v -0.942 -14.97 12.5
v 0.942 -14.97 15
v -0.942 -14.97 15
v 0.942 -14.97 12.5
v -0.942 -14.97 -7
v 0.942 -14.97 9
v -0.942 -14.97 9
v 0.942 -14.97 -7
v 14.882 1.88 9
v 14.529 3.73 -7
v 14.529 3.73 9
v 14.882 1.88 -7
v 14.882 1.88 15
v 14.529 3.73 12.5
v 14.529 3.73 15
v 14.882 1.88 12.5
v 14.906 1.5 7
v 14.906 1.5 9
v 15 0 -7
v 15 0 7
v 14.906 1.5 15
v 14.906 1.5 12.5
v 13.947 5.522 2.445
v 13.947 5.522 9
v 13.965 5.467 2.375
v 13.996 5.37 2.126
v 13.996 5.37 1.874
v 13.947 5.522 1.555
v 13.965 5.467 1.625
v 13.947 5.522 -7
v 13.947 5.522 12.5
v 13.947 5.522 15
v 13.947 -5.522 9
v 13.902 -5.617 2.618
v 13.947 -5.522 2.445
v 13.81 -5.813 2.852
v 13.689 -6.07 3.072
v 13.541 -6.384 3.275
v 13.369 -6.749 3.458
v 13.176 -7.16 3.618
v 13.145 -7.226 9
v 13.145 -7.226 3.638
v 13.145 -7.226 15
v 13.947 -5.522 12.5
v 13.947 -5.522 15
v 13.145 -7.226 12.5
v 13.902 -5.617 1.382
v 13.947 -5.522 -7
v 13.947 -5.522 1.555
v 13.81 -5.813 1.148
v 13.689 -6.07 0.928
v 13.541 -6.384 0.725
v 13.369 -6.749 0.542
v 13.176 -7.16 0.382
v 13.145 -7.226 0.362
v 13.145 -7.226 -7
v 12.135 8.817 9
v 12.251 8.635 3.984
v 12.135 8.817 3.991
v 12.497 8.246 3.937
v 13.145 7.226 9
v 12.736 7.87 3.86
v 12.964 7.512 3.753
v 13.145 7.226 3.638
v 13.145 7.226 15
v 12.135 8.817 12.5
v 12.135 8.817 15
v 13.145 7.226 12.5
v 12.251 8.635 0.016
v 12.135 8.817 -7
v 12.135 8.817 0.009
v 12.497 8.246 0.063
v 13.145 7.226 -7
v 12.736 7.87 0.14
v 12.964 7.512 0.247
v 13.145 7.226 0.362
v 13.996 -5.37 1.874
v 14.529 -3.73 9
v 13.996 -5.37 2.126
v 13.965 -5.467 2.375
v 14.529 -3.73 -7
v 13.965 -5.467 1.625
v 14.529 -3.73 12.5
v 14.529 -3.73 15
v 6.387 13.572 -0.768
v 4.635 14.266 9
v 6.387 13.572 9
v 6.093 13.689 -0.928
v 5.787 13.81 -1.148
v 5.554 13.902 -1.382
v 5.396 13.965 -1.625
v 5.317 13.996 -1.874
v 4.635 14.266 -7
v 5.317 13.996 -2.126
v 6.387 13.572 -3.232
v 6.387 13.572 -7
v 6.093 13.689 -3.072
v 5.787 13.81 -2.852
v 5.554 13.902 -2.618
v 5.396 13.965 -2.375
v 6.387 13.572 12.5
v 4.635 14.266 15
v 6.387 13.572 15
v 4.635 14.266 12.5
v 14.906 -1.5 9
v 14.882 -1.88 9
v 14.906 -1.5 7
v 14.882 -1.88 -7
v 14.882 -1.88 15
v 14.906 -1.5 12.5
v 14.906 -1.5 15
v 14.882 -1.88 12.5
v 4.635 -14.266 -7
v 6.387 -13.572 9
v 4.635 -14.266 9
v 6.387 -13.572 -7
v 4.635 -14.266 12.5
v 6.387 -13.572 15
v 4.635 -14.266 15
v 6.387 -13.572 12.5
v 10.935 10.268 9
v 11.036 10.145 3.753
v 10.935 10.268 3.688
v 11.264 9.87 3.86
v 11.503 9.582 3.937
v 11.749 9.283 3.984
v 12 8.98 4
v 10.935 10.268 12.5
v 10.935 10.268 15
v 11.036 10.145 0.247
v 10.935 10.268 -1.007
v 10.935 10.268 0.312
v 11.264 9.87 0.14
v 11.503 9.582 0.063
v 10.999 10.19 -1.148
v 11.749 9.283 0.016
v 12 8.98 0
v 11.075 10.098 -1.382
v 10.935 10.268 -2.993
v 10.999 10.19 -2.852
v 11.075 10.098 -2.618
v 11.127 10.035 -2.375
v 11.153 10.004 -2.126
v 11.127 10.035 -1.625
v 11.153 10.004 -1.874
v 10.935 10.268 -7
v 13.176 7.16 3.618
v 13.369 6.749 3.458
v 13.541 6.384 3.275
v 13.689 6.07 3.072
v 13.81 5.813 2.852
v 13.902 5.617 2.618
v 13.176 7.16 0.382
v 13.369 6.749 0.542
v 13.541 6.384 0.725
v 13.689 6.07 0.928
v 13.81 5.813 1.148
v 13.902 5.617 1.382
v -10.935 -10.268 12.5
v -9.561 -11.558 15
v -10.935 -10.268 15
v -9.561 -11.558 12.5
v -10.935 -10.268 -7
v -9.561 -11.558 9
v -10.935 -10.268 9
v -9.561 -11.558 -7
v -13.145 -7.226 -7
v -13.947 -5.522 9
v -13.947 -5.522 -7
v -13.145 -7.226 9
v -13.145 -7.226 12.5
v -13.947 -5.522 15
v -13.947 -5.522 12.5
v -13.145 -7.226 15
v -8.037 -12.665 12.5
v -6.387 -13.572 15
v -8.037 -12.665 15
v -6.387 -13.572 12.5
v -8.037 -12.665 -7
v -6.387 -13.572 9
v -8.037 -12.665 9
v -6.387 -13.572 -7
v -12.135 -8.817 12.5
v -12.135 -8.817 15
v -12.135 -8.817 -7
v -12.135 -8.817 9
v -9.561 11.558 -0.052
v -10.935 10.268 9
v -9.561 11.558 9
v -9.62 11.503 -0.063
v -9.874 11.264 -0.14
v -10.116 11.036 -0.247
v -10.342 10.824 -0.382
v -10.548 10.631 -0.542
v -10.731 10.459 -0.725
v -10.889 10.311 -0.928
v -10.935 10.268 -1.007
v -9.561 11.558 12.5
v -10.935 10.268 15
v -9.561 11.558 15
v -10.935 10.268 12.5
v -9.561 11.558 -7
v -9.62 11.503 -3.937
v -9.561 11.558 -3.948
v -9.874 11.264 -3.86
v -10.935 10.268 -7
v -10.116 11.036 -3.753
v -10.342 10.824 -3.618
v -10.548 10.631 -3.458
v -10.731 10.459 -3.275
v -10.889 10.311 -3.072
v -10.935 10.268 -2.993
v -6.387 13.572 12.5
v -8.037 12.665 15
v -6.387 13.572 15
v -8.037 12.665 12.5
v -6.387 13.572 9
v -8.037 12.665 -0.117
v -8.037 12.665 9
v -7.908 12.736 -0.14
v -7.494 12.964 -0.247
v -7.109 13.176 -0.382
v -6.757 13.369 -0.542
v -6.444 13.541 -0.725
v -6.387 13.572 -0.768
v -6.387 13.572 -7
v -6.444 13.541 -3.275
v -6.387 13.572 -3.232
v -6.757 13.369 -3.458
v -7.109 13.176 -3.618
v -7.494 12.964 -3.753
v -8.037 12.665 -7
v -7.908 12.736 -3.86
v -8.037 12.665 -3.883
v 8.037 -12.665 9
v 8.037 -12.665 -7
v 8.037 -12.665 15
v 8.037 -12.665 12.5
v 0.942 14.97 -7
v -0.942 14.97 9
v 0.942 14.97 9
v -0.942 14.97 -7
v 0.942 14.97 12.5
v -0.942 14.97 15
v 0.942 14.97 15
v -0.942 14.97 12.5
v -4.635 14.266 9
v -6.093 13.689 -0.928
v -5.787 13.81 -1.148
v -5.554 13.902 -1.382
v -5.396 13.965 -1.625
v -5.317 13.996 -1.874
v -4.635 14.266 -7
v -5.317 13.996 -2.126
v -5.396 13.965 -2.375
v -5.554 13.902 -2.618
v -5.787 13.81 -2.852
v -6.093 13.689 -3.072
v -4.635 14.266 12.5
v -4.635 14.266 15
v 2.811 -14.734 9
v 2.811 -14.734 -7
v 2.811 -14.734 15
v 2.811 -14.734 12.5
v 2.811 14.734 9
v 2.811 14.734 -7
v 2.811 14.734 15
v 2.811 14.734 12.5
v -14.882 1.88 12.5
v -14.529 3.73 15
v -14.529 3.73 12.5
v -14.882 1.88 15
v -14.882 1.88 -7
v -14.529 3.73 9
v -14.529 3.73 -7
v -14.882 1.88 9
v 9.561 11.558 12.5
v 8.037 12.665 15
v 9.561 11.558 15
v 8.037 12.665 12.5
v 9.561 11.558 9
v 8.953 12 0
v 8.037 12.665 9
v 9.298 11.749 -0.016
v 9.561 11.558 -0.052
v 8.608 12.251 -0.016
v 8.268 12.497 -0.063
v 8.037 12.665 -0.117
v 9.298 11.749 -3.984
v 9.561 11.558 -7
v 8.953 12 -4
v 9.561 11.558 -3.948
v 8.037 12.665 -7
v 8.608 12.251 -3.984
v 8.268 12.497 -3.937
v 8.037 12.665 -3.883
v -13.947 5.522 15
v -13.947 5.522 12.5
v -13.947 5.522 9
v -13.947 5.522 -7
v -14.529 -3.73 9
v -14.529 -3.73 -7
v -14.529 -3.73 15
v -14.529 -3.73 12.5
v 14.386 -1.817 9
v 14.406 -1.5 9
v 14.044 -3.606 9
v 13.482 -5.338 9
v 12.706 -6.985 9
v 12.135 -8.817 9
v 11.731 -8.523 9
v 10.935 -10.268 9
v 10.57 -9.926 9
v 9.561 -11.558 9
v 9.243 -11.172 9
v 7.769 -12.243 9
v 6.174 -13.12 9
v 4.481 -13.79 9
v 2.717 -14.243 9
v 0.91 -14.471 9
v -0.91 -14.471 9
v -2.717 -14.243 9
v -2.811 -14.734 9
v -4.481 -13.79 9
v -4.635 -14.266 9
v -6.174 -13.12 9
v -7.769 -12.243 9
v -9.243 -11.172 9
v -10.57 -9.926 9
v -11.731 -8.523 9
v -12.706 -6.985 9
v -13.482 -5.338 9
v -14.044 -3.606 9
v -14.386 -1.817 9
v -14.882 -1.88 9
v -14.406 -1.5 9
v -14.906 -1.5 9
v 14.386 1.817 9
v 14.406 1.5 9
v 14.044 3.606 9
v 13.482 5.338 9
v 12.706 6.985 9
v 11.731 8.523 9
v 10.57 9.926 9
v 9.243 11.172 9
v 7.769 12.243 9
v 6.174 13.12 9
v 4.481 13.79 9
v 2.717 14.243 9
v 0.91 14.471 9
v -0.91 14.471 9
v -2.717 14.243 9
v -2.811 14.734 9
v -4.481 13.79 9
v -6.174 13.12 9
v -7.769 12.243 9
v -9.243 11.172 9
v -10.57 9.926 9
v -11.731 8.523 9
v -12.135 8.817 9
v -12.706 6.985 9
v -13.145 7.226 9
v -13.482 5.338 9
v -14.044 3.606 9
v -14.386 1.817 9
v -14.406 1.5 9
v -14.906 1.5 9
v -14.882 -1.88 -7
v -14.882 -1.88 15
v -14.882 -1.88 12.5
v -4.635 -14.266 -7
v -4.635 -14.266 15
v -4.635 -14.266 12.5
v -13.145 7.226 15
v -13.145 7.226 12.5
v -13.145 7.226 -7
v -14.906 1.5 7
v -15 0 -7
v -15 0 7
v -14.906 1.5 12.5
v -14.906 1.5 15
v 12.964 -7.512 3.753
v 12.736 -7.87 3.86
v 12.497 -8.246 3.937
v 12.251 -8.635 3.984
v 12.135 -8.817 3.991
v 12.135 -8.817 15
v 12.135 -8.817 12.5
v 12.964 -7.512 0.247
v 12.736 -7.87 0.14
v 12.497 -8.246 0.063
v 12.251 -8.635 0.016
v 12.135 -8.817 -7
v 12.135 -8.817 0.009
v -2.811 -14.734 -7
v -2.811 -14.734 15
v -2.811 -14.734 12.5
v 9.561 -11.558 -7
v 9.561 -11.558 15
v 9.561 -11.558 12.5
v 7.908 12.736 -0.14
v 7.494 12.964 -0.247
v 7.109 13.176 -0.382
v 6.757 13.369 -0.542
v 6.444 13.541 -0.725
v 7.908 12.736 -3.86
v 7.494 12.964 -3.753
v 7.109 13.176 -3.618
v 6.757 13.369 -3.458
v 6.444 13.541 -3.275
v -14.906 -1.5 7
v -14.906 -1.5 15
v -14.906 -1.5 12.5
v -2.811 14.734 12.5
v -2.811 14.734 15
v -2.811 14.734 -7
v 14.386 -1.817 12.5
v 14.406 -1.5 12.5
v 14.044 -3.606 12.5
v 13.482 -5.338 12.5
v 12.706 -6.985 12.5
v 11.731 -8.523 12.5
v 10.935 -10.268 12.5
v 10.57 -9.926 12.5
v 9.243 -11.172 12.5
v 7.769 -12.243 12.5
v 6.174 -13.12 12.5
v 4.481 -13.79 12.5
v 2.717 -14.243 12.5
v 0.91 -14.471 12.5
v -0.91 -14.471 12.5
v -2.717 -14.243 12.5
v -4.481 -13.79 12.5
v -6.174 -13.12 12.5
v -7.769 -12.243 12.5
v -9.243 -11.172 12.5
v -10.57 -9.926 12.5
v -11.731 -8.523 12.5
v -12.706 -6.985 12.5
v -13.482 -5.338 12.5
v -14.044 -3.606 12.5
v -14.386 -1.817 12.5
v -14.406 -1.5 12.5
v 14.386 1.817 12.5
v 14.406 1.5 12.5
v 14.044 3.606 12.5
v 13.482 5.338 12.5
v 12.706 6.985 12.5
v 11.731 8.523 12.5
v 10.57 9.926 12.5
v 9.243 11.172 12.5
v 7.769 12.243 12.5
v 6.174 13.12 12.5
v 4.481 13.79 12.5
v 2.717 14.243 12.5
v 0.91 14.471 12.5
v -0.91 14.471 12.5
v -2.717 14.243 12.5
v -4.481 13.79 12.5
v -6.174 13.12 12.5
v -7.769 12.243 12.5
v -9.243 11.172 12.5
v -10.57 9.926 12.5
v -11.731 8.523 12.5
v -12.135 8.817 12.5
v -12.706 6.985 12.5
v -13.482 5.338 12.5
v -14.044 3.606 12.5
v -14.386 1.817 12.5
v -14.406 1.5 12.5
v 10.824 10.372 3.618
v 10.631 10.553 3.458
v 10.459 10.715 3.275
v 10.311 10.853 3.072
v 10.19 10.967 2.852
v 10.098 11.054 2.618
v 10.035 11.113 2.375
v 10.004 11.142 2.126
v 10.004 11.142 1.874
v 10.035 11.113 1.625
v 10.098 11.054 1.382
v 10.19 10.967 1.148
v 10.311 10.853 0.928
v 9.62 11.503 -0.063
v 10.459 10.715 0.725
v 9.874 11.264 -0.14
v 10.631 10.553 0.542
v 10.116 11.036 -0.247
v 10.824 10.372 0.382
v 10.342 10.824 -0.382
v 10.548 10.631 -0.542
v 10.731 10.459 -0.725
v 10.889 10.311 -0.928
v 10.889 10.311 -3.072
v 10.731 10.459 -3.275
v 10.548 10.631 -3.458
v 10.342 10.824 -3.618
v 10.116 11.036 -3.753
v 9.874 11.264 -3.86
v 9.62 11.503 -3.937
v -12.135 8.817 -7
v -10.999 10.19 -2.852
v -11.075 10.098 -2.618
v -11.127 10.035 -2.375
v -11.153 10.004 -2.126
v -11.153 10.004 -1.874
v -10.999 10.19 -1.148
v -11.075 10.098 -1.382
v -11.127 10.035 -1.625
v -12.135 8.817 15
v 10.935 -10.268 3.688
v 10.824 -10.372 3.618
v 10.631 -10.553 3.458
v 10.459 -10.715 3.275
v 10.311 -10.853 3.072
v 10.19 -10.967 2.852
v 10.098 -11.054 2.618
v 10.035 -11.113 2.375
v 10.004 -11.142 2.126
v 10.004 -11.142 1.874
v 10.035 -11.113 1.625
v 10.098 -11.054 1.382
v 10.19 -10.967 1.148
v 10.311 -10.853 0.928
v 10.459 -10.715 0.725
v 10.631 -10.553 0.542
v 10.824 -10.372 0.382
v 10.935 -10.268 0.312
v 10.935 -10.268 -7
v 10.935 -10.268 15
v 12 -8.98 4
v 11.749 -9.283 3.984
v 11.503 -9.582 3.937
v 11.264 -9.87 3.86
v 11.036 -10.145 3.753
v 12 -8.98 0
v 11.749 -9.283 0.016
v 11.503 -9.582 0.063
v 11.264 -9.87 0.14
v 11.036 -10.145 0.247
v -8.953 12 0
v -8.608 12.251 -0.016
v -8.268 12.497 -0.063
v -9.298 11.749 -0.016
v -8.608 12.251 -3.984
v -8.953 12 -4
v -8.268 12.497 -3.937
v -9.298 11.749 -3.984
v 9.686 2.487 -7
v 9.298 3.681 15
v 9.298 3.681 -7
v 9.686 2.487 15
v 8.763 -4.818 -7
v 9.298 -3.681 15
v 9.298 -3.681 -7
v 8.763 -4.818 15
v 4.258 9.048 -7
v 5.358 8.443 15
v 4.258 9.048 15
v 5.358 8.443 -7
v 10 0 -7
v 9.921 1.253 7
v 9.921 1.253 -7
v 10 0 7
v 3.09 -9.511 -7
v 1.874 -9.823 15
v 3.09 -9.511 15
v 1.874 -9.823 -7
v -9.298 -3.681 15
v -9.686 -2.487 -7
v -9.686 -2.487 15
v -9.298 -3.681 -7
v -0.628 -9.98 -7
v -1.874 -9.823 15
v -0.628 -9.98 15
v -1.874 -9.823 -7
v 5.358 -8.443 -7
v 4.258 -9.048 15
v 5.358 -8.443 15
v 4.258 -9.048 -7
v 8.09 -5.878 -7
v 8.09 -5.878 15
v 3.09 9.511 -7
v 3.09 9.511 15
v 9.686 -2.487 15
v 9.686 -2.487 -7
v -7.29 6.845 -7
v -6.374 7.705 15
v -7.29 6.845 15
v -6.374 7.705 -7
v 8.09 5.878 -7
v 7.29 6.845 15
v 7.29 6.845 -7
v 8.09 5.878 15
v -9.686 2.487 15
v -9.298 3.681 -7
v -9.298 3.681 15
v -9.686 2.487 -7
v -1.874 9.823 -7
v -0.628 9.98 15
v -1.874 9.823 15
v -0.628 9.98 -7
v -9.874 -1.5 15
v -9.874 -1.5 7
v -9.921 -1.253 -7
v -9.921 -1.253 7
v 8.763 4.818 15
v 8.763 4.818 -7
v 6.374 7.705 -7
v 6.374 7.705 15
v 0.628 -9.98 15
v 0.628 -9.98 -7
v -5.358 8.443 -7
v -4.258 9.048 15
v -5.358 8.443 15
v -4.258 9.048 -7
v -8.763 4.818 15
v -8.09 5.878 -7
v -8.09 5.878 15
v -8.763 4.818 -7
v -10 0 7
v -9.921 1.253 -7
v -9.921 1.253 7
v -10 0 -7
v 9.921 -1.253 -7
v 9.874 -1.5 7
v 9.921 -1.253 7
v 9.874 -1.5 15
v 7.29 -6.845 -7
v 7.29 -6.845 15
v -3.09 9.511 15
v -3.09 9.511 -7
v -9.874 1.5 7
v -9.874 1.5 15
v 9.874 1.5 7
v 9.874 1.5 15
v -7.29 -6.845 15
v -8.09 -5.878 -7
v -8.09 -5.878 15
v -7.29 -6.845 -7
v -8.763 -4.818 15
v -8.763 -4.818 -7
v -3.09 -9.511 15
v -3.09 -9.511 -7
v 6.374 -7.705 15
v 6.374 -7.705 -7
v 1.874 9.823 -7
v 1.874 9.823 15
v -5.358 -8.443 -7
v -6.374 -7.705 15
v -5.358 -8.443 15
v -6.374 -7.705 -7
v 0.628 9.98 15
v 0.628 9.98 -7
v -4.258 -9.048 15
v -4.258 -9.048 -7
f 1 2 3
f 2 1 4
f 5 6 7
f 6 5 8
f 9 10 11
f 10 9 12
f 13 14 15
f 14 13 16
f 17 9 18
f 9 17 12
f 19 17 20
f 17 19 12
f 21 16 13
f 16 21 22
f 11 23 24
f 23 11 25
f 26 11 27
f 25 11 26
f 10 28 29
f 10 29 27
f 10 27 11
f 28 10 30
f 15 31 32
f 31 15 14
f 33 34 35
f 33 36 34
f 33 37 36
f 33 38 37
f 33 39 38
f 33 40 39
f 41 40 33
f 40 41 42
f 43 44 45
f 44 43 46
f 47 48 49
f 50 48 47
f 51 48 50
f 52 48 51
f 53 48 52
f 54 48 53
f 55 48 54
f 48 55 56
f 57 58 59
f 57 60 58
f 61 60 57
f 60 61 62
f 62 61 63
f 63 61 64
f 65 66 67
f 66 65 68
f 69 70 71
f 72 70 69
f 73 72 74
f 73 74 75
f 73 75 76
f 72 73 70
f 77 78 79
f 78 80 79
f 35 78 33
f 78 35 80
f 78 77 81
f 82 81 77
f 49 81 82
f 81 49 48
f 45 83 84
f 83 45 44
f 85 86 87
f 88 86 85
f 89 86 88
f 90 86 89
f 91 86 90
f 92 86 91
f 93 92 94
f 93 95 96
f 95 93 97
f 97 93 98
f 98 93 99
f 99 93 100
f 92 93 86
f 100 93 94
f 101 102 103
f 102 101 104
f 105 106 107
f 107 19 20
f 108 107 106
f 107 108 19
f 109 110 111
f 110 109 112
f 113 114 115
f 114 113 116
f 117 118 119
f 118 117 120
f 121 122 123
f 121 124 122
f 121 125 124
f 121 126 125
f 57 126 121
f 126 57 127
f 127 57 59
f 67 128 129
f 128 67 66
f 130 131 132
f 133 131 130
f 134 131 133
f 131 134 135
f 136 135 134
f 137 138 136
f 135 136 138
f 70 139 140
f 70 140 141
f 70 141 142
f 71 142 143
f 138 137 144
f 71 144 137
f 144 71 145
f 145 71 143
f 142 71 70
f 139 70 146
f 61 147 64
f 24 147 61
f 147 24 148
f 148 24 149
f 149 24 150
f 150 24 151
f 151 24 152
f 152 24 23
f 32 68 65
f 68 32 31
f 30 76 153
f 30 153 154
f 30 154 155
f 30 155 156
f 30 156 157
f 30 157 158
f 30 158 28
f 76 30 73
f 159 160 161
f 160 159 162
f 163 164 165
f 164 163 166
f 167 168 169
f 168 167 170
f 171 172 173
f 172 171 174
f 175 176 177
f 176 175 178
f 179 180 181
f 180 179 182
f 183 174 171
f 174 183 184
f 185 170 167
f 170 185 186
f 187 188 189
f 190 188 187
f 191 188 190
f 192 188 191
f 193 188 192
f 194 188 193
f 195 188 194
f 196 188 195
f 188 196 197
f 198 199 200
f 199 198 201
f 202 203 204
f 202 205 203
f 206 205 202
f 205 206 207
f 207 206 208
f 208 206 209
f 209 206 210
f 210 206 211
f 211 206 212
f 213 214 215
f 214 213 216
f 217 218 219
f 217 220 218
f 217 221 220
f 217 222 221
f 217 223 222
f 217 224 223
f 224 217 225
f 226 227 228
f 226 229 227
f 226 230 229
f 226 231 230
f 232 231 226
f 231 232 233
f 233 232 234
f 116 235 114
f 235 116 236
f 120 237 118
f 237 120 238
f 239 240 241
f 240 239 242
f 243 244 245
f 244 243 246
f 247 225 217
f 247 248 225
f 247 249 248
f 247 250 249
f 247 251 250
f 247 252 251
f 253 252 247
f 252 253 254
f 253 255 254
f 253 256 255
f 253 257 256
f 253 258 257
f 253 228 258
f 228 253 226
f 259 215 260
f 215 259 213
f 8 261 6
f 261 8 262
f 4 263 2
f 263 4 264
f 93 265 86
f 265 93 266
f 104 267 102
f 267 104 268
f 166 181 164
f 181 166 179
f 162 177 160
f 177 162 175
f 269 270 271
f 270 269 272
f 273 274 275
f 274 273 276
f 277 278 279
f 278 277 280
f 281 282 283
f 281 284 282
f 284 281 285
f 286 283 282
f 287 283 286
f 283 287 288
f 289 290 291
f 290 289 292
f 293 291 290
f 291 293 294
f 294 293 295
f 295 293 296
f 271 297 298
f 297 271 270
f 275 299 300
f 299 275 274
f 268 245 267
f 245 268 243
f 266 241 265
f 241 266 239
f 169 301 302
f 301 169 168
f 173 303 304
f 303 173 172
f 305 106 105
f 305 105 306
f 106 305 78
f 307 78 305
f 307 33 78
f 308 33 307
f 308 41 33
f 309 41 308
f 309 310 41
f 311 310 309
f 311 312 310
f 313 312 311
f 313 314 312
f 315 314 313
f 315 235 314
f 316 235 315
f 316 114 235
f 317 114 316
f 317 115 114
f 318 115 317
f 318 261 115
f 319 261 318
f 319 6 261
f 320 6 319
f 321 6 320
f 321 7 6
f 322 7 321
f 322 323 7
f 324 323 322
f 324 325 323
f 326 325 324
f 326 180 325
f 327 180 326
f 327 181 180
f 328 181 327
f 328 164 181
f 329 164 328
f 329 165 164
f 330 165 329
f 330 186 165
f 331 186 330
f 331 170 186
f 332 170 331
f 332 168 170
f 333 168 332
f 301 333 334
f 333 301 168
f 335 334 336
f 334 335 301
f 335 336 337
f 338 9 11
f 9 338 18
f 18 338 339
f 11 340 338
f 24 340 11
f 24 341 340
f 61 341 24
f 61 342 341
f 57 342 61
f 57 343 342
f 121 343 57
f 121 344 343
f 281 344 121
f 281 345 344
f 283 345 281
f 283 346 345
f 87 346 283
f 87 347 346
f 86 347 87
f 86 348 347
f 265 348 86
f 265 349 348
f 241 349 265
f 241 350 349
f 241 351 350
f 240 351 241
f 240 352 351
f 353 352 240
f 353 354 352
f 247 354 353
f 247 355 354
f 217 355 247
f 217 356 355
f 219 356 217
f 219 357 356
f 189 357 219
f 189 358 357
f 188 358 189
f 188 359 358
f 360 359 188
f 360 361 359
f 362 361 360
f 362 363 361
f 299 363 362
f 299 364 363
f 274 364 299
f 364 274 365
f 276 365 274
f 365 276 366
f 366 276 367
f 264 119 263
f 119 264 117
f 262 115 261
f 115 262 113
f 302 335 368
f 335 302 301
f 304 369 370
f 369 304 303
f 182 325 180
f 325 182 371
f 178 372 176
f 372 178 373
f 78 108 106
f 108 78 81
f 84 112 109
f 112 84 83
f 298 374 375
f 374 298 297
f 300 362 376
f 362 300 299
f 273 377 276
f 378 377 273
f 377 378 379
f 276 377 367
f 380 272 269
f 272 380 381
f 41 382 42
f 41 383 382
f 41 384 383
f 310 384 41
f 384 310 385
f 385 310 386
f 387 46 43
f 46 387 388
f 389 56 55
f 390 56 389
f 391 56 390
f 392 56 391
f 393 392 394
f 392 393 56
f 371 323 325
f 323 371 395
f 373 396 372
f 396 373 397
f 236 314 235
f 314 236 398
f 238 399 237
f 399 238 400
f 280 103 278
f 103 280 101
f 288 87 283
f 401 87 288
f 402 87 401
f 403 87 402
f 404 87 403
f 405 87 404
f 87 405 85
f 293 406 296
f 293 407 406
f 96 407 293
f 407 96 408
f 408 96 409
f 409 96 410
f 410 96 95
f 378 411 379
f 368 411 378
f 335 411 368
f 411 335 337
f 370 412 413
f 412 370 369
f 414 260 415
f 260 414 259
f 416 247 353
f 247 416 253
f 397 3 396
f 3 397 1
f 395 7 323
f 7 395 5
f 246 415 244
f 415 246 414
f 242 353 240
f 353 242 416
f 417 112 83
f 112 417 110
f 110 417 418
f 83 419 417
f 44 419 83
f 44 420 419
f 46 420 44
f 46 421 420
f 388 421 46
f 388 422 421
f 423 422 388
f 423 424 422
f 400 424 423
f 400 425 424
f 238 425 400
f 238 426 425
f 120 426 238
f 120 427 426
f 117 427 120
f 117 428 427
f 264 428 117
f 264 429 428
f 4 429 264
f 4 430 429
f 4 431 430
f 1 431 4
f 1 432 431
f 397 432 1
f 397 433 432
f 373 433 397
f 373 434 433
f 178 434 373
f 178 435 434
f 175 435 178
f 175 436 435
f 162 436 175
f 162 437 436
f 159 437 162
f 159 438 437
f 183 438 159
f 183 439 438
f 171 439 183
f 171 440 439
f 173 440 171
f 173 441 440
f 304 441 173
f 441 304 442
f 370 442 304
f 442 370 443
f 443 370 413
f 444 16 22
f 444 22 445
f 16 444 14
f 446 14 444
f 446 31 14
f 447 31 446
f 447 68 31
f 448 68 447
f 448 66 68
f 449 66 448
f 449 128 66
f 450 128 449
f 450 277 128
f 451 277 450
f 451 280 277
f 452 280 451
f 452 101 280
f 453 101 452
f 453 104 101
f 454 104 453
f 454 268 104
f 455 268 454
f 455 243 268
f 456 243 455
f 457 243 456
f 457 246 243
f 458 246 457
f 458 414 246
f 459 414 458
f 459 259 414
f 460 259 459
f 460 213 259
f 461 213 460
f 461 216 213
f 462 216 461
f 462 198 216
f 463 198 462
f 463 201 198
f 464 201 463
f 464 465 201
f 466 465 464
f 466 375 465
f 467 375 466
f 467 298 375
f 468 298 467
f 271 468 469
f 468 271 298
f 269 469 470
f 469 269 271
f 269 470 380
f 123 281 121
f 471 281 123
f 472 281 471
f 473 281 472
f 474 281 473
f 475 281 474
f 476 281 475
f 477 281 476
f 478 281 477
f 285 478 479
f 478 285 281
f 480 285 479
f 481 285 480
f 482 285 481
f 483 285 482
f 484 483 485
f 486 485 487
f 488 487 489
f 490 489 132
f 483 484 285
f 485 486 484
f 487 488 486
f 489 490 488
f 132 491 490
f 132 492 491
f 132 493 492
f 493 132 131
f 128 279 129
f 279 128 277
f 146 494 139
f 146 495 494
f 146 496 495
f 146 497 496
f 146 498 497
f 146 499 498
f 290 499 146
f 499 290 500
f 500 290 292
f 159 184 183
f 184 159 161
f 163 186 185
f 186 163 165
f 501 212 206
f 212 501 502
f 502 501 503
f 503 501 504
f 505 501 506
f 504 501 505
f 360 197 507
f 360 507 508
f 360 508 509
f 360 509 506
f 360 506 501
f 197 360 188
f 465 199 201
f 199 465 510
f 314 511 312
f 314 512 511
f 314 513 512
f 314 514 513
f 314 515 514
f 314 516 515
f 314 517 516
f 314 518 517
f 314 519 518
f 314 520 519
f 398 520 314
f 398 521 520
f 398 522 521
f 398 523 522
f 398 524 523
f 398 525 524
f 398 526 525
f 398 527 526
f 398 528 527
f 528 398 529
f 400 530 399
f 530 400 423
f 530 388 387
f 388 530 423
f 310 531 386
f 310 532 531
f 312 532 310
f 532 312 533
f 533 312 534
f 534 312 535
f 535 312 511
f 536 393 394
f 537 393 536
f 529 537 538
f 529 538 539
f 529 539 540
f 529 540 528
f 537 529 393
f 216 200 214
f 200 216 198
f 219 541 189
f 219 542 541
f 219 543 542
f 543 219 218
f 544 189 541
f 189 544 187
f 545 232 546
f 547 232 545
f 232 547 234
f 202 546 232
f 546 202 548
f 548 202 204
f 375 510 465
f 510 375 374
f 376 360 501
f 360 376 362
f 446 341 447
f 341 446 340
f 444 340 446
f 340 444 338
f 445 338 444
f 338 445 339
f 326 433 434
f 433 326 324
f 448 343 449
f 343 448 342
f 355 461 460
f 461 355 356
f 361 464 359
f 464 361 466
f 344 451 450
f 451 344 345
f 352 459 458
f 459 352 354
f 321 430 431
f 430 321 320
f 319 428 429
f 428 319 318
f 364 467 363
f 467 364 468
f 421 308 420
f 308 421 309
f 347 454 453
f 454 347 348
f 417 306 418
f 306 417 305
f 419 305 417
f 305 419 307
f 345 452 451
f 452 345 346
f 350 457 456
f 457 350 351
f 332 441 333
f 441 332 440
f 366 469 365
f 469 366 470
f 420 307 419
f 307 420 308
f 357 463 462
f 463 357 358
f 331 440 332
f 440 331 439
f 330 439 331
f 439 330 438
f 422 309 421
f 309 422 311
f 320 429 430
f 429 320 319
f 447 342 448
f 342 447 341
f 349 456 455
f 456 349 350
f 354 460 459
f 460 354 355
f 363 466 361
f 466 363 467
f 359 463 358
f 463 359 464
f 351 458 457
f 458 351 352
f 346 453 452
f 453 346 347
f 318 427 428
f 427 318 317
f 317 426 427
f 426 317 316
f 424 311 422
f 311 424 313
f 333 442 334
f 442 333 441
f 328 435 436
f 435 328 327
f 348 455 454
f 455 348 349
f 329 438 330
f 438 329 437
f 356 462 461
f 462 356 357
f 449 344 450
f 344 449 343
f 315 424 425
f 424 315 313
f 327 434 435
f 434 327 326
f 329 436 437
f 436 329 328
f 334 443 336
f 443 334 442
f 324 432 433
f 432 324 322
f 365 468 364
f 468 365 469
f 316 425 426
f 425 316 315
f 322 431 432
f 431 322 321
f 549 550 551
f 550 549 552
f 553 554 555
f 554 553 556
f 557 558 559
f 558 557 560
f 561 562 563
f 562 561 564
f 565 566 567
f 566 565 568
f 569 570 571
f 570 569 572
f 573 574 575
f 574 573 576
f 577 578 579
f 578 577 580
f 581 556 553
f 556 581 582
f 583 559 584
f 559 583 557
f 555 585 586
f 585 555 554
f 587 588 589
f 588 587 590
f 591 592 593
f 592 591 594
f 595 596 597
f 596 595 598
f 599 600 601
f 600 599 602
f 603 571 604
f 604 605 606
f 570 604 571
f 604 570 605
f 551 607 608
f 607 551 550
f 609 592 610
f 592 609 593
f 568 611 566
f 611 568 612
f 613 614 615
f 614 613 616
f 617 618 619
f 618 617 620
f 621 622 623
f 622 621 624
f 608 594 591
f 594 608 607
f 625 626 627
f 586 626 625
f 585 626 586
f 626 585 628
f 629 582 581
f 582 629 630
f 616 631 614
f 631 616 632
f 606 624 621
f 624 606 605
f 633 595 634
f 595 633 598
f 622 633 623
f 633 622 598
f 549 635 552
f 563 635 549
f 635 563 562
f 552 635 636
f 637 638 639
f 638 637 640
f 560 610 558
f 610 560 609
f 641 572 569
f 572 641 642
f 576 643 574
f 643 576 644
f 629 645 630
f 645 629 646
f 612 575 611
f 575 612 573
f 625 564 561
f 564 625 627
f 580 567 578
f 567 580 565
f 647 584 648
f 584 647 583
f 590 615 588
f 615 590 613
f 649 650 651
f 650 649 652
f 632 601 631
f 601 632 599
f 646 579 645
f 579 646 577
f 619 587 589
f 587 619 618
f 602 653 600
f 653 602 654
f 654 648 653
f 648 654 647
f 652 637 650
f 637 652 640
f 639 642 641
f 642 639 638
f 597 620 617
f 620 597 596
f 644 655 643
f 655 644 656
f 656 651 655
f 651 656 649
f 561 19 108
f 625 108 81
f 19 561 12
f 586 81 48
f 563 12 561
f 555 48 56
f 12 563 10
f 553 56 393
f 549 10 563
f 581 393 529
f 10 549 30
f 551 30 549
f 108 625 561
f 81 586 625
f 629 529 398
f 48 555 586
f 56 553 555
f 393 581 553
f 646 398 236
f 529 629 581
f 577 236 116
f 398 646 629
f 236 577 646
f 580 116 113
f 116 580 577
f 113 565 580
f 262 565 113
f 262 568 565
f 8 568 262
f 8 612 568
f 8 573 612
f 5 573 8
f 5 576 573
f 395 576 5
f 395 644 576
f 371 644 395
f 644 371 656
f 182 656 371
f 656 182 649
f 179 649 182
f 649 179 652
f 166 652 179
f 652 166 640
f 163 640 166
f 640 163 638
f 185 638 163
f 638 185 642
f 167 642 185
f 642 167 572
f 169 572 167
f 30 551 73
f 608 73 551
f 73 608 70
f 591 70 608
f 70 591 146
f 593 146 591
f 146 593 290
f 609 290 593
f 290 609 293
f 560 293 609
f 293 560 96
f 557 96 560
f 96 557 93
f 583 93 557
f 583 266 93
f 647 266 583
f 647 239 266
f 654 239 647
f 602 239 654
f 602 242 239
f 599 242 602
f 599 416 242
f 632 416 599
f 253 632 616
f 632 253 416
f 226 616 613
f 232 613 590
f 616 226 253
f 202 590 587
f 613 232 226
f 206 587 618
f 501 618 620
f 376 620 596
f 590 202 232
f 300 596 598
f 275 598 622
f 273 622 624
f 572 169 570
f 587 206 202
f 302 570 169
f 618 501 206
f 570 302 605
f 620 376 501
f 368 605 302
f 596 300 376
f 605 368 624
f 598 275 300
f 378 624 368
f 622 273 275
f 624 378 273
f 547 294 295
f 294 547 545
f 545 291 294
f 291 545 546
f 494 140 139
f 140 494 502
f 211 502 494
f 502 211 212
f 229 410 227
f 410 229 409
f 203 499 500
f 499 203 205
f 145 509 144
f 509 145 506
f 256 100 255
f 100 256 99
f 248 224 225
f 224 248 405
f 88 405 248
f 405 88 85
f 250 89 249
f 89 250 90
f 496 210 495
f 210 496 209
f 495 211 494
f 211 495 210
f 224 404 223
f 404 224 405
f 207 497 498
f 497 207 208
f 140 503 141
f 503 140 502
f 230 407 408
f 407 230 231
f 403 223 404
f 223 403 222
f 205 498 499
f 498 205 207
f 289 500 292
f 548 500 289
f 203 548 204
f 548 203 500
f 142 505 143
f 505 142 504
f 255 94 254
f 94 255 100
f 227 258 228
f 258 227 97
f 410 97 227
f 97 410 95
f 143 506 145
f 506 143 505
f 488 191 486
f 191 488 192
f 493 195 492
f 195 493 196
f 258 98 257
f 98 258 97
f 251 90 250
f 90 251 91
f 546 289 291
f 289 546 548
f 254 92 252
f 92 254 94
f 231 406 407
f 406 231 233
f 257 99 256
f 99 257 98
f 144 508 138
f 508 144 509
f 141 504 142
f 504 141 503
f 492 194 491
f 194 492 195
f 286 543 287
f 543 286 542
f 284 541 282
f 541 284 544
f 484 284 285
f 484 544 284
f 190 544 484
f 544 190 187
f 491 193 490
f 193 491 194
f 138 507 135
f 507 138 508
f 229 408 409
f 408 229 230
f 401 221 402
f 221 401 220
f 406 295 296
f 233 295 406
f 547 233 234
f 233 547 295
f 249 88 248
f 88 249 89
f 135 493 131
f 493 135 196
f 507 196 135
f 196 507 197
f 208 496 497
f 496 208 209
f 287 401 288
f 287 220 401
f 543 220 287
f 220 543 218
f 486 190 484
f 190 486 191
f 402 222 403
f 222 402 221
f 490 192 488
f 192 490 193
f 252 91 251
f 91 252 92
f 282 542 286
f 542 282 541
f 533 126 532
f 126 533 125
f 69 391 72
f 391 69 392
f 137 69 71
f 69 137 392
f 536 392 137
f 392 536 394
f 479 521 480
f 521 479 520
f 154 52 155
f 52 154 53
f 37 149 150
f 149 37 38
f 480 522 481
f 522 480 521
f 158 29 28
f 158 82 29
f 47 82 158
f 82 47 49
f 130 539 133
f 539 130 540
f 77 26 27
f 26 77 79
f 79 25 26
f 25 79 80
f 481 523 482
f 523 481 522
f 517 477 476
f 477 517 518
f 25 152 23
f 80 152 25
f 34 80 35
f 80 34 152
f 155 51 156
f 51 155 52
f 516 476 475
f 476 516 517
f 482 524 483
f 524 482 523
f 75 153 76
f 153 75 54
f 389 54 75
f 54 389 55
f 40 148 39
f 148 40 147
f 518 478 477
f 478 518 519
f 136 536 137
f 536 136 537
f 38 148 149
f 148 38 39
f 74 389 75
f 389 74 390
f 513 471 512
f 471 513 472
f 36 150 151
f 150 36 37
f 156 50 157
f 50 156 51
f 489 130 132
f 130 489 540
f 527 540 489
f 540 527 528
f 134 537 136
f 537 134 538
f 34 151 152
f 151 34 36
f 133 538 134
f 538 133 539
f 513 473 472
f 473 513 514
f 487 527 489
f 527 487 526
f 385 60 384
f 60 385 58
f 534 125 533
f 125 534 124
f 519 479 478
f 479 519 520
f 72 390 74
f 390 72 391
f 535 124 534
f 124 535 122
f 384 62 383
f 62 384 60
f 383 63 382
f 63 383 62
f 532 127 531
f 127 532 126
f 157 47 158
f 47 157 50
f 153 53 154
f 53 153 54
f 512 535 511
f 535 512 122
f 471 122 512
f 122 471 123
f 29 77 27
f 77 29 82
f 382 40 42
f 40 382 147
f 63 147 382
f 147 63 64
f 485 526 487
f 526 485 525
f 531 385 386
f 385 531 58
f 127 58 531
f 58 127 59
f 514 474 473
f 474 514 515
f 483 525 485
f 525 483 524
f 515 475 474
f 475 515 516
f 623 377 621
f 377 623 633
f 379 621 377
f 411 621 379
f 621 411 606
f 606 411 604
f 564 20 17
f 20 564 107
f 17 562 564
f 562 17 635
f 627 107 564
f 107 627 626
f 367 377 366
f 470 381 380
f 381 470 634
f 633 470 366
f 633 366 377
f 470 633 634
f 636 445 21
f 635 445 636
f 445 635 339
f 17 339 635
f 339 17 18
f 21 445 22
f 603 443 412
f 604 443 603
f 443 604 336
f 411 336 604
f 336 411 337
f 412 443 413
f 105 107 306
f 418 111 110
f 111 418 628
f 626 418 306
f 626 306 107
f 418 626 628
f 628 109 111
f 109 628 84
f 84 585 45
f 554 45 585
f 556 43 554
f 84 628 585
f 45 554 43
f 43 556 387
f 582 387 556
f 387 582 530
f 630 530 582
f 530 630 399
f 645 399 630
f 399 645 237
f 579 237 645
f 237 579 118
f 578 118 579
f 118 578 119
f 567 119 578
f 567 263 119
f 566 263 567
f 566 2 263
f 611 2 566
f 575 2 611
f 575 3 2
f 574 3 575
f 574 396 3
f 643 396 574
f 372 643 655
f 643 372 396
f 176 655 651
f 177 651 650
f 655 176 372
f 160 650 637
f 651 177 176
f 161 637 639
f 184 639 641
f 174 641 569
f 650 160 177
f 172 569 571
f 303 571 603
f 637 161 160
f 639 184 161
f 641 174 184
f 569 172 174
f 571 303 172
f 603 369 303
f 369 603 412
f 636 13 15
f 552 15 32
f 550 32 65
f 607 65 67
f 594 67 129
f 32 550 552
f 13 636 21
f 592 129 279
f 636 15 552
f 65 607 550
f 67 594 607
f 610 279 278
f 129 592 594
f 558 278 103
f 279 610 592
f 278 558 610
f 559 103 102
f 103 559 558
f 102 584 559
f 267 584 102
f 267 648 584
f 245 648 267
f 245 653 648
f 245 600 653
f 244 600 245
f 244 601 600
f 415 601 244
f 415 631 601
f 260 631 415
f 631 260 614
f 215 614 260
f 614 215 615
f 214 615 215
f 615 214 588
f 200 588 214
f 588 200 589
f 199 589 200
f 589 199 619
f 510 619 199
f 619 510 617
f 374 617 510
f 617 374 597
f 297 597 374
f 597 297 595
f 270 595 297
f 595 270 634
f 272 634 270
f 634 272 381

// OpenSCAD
//Yagi element to mast mounting bracket
//Satnogs Project MPL2.0 http://satnogs.org

$fn=50; //High Resolution

el_d = 4; 					   //Element diameter
mast_d = 20; 					//Mast diameter
cube_e = mast_d+el_d*2+2;  //Cube edge
mount_l = 14; 					//Mount length


module element()
{
	cylinder(h=mast_d*2,d=el_d);
}

module tire_up()
{
	difference() {
		cylinder(h=3.5,d=cube_e);
		cylinder(h=3.5,d=cube_e-1);
	}
}

module satnogs_yagi_mount()
{
	rotate([0,90,0])
		intersection() {
			difference() {
				translate([-cube_e/2,-cube_e/2,-cube_e/2])
					cube([cube_e,cube_e,cube_e]);
			   union() {
					rotate([0,270,0])
						translate([0,0,-mount_l/2])
							cylinder(h=mount_l*2,d=mast_d);
				   translate([el_d/2,mast_d/2+el_d/2,-mast_d])
						element();
					rotate([90,0,0])
						translate([-el_d/2,mast_d/2+el_d/2,-mast_d])
							element();
					translate([-mount_l*1.5,-1.5,-(mast_d+el_d*2+2)/2])
						cube([mount_l,3,mast_d+el_d*2+2]);
					rotate([0,270,0])
						translate([0,0,mount_l-5])
							tire_up();
				}
			}
		   rotate([0,270,0])
				translate([0,0,-mount_l/2])
					cylinder(h=mount_l*2,d=mast_d+el_d*2+2);
		}
}

satnogs_yagi_mount();
